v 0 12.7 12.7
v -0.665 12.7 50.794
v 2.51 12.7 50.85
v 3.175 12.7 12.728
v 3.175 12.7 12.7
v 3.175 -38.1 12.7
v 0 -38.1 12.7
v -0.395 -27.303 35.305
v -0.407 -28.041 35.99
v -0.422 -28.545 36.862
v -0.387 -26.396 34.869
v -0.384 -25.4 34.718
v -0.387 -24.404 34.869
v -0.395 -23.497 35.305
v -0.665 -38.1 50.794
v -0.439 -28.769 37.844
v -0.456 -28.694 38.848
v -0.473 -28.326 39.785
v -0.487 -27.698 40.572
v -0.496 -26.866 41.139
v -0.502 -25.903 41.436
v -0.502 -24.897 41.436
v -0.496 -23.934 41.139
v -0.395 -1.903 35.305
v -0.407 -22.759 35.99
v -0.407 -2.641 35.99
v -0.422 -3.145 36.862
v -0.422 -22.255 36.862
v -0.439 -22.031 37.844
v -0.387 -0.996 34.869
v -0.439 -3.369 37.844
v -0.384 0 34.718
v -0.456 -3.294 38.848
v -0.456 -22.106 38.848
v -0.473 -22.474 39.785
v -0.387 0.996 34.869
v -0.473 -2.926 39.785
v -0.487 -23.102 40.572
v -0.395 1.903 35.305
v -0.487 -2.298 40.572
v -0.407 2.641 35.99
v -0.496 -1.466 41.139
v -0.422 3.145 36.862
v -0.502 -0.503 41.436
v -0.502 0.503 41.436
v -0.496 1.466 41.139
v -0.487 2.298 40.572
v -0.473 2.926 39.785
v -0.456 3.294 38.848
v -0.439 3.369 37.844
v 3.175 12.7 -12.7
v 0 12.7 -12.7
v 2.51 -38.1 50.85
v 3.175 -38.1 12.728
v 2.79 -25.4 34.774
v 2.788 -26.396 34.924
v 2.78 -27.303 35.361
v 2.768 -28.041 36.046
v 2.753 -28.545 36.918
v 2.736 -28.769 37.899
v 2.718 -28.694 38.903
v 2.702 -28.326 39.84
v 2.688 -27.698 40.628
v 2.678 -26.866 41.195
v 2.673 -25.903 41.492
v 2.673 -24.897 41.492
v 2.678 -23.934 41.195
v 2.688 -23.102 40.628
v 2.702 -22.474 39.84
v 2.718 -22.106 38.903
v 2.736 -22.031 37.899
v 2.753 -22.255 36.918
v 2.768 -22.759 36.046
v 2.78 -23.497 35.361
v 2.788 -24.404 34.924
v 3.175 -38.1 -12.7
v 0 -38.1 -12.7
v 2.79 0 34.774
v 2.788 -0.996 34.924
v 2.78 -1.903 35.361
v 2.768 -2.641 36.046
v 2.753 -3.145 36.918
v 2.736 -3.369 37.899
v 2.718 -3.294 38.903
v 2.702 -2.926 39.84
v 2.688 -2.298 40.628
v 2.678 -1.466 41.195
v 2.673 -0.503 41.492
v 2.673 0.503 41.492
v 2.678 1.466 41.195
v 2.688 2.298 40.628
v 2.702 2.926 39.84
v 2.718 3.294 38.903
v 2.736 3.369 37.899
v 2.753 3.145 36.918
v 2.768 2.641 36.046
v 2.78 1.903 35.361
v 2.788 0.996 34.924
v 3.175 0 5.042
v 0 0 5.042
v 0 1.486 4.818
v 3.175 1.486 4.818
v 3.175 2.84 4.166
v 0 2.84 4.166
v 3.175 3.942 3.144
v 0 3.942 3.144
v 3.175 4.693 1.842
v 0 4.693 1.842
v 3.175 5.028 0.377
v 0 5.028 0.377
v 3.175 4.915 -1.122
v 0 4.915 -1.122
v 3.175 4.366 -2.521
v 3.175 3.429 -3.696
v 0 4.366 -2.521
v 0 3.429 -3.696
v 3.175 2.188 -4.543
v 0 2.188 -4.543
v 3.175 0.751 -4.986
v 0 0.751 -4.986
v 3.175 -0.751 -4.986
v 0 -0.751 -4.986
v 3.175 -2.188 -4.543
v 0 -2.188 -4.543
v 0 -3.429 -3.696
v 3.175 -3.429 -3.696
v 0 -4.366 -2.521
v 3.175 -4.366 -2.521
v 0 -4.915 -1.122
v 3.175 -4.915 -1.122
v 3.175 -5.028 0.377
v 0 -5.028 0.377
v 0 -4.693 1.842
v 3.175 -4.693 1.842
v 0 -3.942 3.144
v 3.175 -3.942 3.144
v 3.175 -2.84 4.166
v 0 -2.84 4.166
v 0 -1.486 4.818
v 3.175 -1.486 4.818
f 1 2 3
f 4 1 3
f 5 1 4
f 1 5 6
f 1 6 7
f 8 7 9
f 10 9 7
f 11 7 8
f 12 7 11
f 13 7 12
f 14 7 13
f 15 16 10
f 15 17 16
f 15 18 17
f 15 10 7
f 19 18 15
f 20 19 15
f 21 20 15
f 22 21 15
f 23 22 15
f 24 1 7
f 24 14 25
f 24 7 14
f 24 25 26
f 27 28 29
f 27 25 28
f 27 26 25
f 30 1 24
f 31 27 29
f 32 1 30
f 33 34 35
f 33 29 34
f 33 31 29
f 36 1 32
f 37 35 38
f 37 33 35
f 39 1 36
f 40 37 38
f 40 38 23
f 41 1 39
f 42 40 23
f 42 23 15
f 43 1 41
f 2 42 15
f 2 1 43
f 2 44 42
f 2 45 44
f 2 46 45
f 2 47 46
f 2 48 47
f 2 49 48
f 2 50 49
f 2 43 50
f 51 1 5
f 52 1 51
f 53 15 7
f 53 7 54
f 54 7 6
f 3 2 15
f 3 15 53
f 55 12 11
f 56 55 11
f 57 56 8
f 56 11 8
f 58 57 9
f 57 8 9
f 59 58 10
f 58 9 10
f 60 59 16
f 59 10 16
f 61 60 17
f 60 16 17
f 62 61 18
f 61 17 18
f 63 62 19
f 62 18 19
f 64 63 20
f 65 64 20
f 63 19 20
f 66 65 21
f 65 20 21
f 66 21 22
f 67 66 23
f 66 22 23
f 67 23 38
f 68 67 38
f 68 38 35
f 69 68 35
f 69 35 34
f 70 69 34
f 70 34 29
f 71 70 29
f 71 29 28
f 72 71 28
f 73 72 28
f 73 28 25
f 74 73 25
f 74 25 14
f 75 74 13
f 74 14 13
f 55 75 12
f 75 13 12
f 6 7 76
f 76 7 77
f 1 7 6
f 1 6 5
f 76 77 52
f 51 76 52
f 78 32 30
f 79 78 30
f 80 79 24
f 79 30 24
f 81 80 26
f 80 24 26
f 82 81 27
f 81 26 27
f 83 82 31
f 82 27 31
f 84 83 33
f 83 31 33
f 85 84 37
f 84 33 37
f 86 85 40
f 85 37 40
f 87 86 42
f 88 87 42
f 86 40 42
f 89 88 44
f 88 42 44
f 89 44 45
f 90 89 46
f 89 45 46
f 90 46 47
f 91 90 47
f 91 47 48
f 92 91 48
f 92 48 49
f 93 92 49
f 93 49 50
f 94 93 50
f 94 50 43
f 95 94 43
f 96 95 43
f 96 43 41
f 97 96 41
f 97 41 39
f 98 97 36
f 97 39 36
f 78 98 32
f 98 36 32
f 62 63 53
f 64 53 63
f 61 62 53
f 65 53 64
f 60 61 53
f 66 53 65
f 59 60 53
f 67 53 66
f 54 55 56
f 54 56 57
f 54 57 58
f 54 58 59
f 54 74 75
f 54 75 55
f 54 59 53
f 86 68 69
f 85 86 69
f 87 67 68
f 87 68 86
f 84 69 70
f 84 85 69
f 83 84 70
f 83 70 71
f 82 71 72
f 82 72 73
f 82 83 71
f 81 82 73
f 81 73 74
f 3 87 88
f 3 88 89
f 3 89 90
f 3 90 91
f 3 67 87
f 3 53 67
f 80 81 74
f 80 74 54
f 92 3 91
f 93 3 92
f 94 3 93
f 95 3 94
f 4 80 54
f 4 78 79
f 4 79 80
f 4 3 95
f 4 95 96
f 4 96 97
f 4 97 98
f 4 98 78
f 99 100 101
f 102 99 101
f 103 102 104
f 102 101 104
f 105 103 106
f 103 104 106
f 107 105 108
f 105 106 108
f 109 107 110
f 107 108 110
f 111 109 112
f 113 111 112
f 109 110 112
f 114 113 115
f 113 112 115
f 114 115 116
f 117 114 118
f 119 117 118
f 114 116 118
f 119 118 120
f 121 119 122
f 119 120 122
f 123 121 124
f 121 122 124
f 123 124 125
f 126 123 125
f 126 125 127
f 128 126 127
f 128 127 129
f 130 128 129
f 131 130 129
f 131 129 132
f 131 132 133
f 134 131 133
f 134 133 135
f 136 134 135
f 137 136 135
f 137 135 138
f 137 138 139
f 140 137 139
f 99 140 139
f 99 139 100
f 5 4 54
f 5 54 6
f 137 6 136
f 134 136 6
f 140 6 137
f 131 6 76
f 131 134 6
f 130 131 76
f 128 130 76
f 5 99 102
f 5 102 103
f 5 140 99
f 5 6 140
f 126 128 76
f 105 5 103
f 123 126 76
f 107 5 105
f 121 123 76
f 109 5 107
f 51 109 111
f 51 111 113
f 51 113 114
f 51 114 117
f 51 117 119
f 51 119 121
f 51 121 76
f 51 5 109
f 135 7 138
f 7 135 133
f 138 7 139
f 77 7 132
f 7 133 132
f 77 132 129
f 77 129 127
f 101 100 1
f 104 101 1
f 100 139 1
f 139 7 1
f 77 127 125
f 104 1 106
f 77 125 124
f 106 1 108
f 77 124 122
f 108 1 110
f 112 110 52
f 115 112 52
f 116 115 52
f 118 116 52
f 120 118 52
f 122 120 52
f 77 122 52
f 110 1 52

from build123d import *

# Parameters (mm, degrees)
SKETCH1_W                        = 25.4
SKETCH1_H                        = 50.8
BOSS_EXTRUDE1_DEPTH              = 3.175
F_3_8_CLEARANCE_HOLE1_D          = 10.0838
BOSS_EXTRUDE2_DEPTH              = 50.8
SKETCH5_W                        = 3.3782
SKETCH5_H                        = 3.839835412
F_1_4_CLEARANCE_HOLE1_AT_2_COUNT = 2
F_1_4_CLEARANCE_HOLE1_AT_2_PITCH = 25.4


with BuildPart() as part:
    # Sketch1 → Boss-Extrude1 (new body)
    with BuildSketch(Plane(origin=(0, 0, 0), x_dir=(0, 0, -1), z_dir=(1, 0, 0))):
        with Locations((0, -12.7)):
            Rectangle(SKETCH1_W, SKETCH1_H)
    extrude(amount=BOSS_EXTRUDE1_DEPTH)

    # 3/8 Clearance Hole1 (through all)
    with Locations(Plane(origin=(3.175, 0, 0), x_dir=(0, 0, -1), z_dir=(1, 0, 0))):
        with Locations((0, 0)):
            Hole(F_3_8_CLEARANCE_HOLE1_D / 2)


with BuildPart() as body_2:
    # Sketch6 → Boss-Extrude2 (new body)
    with BuildSketch(Plane(origin=(0, 12.7, 0), x_dir=(1, 0, 0), z_dir=(0, 1, 0))):
        Polygon((0, -12.7), (-0.664936685, -50.794197185), (2.509579747, -50.849608576), (3.175, -12.727707805), (3.175, -12.7), align=None)
    extrude(amount=-BOSS_EXTRUDE2_DEPTH)

    # Sketch5 → 1/4 Clearance Hole1 (revolve, cut)
    with BuildSketch(Plane(origin=(2.731225309, 0, 38.151542847), x_dir=(0.017452406, 0, -0.999847695), z_dir=(0, 1, 0))):
        with Locations((1.6891, 1.919917706)):
            Rectangle(SKETCH5_W, SKETCH5_H)
    f_1_4_clearance_hole1 = revolve(axis=Axis((9.080258173, 0, 38.262365628), (-0.999847695, 0, -0.017452406)), mode=Mode.SUBTRACT)

    # 1/4 Clearance Hole1 at 2: 1/4 Clearance Hole1 ×2
    with Locations(*[(0, -i * F_1_4_CLEARANCE_HOLE1_AT_2_PITCH, 0) for i in range(1, F_1_4_CLEARANCE_HOLE1_AT_2_COUNT)]):
        add(f_1_4_clearance_hole1, mode=Mode.SUBTRACT)


solid = Compound([part.part, body_2.part])
